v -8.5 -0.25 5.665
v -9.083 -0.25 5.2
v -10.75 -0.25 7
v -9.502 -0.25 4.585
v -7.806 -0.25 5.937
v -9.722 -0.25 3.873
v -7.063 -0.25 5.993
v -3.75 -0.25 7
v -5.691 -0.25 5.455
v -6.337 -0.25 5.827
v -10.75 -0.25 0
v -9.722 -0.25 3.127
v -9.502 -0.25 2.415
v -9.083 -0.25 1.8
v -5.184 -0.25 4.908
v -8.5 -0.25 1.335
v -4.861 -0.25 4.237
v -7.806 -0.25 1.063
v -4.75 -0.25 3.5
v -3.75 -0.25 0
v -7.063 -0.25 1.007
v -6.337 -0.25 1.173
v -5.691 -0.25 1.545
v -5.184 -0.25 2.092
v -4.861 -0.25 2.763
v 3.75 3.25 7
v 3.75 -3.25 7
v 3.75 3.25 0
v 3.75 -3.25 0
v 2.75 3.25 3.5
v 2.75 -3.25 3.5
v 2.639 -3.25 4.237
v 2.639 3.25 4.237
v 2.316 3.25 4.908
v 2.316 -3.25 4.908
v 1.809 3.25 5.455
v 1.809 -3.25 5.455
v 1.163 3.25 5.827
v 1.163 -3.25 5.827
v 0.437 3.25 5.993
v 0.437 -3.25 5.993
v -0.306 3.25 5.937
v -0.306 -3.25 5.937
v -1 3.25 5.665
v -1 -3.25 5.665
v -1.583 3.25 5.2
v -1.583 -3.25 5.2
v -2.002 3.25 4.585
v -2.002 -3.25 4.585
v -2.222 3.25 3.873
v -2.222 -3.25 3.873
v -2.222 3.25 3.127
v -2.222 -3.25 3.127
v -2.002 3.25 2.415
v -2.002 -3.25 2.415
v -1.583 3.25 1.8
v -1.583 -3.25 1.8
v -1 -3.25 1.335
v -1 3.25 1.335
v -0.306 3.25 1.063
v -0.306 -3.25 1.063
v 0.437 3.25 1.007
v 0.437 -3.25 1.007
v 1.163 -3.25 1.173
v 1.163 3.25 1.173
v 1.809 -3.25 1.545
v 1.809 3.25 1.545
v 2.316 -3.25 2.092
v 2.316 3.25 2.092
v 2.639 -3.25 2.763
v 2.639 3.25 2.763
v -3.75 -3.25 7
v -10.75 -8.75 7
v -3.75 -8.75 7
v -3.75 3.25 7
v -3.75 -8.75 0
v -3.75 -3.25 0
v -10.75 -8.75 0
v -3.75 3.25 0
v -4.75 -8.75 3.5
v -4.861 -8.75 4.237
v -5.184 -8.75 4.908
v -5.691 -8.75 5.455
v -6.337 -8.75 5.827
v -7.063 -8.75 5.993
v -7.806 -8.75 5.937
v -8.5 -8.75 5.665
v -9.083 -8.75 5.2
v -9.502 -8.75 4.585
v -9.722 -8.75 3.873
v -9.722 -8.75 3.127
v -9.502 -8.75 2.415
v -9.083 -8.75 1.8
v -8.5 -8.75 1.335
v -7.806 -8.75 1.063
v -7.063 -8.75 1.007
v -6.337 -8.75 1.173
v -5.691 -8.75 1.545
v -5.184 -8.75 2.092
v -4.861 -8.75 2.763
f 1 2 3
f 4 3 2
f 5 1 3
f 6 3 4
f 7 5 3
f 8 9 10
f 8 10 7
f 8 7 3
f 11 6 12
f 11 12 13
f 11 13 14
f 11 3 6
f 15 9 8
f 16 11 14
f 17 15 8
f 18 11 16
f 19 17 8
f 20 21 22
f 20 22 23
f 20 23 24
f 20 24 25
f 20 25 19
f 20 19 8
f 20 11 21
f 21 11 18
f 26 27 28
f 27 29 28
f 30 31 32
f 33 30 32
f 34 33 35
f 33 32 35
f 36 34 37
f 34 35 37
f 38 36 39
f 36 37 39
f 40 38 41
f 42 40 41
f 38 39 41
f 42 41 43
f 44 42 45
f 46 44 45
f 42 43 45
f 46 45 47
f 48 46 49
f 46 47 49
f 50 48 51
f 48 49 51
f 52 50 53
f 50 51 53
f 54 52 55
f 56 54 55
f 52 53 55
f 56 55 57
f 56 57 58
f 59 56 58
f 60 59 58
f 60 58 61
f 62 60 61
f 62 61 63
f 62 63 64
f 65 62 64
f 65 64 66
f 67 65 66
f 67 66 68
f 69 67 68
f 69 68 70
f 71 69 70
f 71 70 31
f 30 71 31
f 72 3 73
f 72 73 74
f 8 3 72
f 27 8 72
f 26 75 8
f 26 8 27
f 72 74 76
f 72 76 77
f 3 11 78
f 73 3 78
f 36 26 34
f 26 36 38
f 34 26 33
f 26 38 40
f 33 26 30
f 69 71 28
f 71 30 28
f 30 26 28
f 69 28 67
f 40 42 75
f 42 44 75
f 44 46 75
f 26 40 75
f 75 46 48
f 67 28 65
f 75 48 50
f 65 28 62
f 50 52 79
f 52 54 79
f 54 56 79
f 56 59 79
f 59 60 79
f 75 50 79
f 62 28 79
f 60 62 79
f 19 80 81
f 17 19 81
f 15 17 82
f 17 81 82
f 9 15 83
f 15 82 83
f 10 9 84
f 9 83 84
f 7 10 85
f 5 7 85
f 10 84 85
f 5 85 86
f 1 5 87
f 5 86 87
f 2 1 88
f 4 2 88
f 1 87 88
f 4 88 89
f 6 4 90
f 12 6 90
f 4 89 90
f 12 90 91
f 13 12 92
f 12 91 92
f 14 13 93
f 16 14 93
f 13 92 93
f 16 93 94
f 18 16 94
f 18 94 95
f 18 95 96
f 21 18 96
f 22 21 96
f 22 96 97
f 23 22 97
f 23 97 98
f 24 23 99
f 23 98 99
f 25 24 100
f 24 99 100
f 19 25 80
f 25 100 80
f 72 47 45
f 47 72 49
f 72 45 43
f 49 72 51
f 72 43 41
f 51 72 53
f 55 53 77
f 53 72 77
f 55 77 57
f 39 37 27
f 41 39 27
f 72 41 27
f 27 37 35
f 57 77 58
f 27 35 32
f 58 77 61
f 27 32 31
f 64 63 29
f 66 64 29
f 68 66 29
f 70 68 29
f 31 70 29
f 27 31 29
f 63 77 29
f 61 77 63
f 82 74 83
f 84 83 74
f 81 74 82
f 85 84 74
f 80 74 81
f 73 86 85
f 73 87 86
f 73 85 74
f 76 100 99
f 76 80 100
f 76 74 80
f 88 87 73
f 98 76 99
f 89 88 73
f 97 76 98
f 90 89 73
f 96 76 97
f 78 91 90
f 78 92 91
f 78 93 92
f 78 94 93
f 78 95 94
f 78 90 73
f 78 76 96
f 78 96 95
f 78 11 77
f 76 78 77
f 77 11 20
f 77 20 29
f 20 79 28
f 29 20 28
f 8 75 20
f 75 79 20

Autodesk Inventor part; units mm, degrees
ref_plane "YZ Plane" through (0, 0, 0) normal (1, 0, 0) x (0, 1, 0)
ref_plane "XZ Plane" through (0, 0, 0) normal (0, 1, 0) x (-1, 0, 0)
ref_plane "XY Plane" through (0, 0, 0) normal (0, 0, 1) x (1, 0, 0)
sketch "スケッチ1" plane through (0, 0, 0) normal (0, 0, 1) x (1, 0, 0)
  line L0 (-3.75, 3.25) -> (3.75, 3.25) construction
  line L1 (3.75, 3.25) -> (3.75, -3.25) construction
  line L2 (3.75, -3.25) -> (-3.75, -3.25) construction
  line L3 (-3.75, -3.25) -> (-3.75, 3.25) construction
  line L4 (0, 0) -> (0, 2.4906) construction
  line L5 (0, 0) -> (2.3218, 0) construction
  line L6 (0.25, 3.25) -> (0.25, -3.25) construction
  line L7 (-2.25, 3.25) -> (-2.25, -3.25) construction
  line L8 (2.75, 3.25) -> (2.75, -3.25) construction
  line L9 (-3.75, 3.25) -> (3.75, -3.25) construction
  line L10 (-3.75, -3.25) -> (3.75, 3.25) construction
  line L11 (-10.75, -0.25) -> (-3.75, -0.25) construction
  line L12 (-3.75, -0.25) -> (-3.75, -8.75) construction
  line L13 (-3.75, -8.75) -> (-10.75, -8.75) construction
  line L14 (-10.75, -8.75) -> (-10.75, -0.25) construction
  line L15 (-10.75, -0.25) -> (-3.75, -8.75) construction
  line L16 (-3.75, -0.25) -> (-10.75, -8.75) construction
  line L17 (-9.75, -0.25) -> (-9.75, -8.75) construction
  line L18 (-4.75, -0.25) -> (-4.75, -8.75) construction
  line L19 (-9.75, -0.25) -> (-4.75, -8.75) construction
  line L20 (-9.75, -8.75) -> (-4.75, -0.25) construction
  line L21 (-7.25, -4.5) -> (-7.25, -8.75) construction
  line L22 (-2.25, 3.25) -> (2.75, -3.25) construction
  line L23 (-2.25, -3.25) -> (2.75, 3.25) construction
  point P0 (-7.25, -4.5)
  dimension "d0" = 5
  dimension "d1" = 6.5
  dimension "d2" = 1
  dimension "d3" = 1.5
  dimension "d31" = 5
  dimension "d32" = 1
  dimension "d33" = 1
  dimension "d34" = 8.5
  dimension "d35" = 3.5
sketch "スケッチ6" plane through (0, 0, 0) normal (0, 0, 1) x (1, 0, 0)
  line L0 (-3.75, 3.25) -> (3.75, 3.25) construction
  line L1 (3.75, 3.25) -> (3.75, -3.25) construction
  line L2 (3.75, -3.25) -> (-3.75, -3.25) construction
  line L3 (-3.75, -3.25) -> (-3.75, 3.25) construction
  line L4 (-2.25, 3.25) -> (-2.25, -3.25) construction
  line L5 (0, 0) -> (0, 2.4906) construction
  line L6 (0, 0) -> (2.3218, 0) construction
  line L7 (0.25, 3.25) -> (0.25, -3.25) construction
  line L8 (-3.75, 3.25) -> (3.75, -3.25) construction
  line L9 (-3.75, -3.25) -> (3.75, 3.25) construction
  line L10 (2.75, 3.25) -> (2.75, -3.25) construction
  line L11 (-3.75, -0.25) -> (-3.75, -8.75) construction
  line L12 (-4.75, -0.25) -> (-4.75, -8.75) construction
  line L13 (-10.75, -0.25) -> (-3.75, -0.25) construction
  line L14 (-9.75, -0.25) -> (-9.75, -8.75) construction
  line L15 (-10.75, -0.25) -> (-3.75, -8.75) construction
  line L16 (-10.75, -8.75) -> (-10.75, -0.25) construction
  line L17 (-3.75, -0.25) -> (-10.75, -8.75) construction
  line L18 (-3.75, -8.75) -> (-10.75, -8.75) construction
  line L19 (-10.75, -0.25) -> (-10.75, -8.75)
  line L20 (-3.75, -8.75) -> (-10.75, -8.75)
  line L21 (-3.75, -8.75) -> (-3.75, -3.25)
  line L22 (-3.75, -3.25) -> (3.75, -3.25)
  line L23 (3.75, -3.25) -> (3.75, 3.25)
  line L24 (3.75, 3.25) -> (-3.75, 3.25)
  line L25 (-3.75, 3.25) -> (-3.75, -0.25)
  line L26 (-10.75, -0.25) -> (-3.75, -0.25)
  line L27 (-2.25, 3.25) -> (2.75, -3.25) construction
  line L28 (-2.25, -3.25) -> (2.75, 3.25) construction
  line L29 (-7.25, -4.5) -> (-7.25, -8.75) construction
  line L30 (-9.75, -0.25) -> (-4.75, -8.75) construction
  line L31 (-9.75, -8.75) -> (-4.75, -0.25) construction
  point P0 (-7.25, -4.5)
extrude "押し出し5" add sketch "スケッチ6" along normal blind 7
ref_plane "作業平面4" through (-10.75, -8.75, 0) normal (0, -1, 0) x (1, 0, 0)
sketch "スケッチ7" plane through (-10.75, -8.75, 0) normal (0, -1, 0) x (1, 0, 0)
  line L0 (7, 7) -> (14.5, 7) projected
  line L1 (14.5, 7) -> (7, 7) projected
  line L2 (7, 0) -> (7, 7) projected
  line L3 (7, 0) -> (14.5, 0) projected
  line L4 (14.5, 0) -> (14.5, 7) projected
  line L5 (7, 0) -> (7, 7) projected
  line L6 (7, 0) -> (7, 7) projected
  line L7 (14.5, 0) -> (7, 0) projected
  line L8 (14.5, 0) -> (14.5, 7) projected
  line L9 (0, 0) -> (0, 7) projected
  line L10 (0, 0) -> (7, 0) projected
  line L11 (7, 7) -> (0, 7) projected
  line L12 (0, 0) -> (0, 7) projected
  line L13 (7, 0) -> (0, 0) projected
  line L14 (0, 0) -> (7, 0) construction
  line L15 (1, 0) -> (6, 0) construction
  line L16 (1, 0) -> (6, 0) construction
  line L17 (0, 0) -> (7, 0) construction
  line L18 (7, 0) -> (0, 0) construction
  line L19 (7, 0) -> (0, 0) construction
  line L20 (7, 0) -> (14.5, 0) construction
  line L21 (14.5, 0) -> (7, 0) construction
  line L22 (10.75, 0) -> (13.0718, 0) construction
  line L23 (7, 0) -> (14.5, 0) construction
  line L24 (7, 0) -> (14.5, 0) construction
  line L25 (8.5, 0) -> (13.5, 0) construction
  line L26 (8.5, 0) -> (13.5, 0) construction
  line L27 (3.5, 0) -> (3.5, 7) construction
  line L28 (1, 0) -> (1, 7) construction
  line L29 (6, 0) -> (6, 7) construction
  line L30 (0, 7) -> (7, 7) projected
  line L31 (1, 7) -> (6, 0) construction
  line L32 (1, 0) -> (6, 7) construction
  circle A0 centre (3.5, 3.5) radius 2.5
  line L33 (8.5, 0) -> (8.5, 7) construction
  line L34 (11, 0) -> (11, 7) construction
  line L35 (13.5, 0) -> (13.5, 7) construction
  line L36 (8.5, 7) -> (13.5, 0) construction
  line L37 (8.5, 0) -> (13.5, 7) construction
  circle A1 centre (11, 3.5) radius 2.5
  point P0 (3.5, 0)
  point P1 (3.5, 0)
  point P2 (10.75, 0)
  point P3 (11, 0)
  dimension "d39" = 5
  dimension "d40" = 5
extrude "押し出し6" cut sketch "スケッチ7" against normal blind 20 contours A0 | A1
properties part number "sensorholder"
